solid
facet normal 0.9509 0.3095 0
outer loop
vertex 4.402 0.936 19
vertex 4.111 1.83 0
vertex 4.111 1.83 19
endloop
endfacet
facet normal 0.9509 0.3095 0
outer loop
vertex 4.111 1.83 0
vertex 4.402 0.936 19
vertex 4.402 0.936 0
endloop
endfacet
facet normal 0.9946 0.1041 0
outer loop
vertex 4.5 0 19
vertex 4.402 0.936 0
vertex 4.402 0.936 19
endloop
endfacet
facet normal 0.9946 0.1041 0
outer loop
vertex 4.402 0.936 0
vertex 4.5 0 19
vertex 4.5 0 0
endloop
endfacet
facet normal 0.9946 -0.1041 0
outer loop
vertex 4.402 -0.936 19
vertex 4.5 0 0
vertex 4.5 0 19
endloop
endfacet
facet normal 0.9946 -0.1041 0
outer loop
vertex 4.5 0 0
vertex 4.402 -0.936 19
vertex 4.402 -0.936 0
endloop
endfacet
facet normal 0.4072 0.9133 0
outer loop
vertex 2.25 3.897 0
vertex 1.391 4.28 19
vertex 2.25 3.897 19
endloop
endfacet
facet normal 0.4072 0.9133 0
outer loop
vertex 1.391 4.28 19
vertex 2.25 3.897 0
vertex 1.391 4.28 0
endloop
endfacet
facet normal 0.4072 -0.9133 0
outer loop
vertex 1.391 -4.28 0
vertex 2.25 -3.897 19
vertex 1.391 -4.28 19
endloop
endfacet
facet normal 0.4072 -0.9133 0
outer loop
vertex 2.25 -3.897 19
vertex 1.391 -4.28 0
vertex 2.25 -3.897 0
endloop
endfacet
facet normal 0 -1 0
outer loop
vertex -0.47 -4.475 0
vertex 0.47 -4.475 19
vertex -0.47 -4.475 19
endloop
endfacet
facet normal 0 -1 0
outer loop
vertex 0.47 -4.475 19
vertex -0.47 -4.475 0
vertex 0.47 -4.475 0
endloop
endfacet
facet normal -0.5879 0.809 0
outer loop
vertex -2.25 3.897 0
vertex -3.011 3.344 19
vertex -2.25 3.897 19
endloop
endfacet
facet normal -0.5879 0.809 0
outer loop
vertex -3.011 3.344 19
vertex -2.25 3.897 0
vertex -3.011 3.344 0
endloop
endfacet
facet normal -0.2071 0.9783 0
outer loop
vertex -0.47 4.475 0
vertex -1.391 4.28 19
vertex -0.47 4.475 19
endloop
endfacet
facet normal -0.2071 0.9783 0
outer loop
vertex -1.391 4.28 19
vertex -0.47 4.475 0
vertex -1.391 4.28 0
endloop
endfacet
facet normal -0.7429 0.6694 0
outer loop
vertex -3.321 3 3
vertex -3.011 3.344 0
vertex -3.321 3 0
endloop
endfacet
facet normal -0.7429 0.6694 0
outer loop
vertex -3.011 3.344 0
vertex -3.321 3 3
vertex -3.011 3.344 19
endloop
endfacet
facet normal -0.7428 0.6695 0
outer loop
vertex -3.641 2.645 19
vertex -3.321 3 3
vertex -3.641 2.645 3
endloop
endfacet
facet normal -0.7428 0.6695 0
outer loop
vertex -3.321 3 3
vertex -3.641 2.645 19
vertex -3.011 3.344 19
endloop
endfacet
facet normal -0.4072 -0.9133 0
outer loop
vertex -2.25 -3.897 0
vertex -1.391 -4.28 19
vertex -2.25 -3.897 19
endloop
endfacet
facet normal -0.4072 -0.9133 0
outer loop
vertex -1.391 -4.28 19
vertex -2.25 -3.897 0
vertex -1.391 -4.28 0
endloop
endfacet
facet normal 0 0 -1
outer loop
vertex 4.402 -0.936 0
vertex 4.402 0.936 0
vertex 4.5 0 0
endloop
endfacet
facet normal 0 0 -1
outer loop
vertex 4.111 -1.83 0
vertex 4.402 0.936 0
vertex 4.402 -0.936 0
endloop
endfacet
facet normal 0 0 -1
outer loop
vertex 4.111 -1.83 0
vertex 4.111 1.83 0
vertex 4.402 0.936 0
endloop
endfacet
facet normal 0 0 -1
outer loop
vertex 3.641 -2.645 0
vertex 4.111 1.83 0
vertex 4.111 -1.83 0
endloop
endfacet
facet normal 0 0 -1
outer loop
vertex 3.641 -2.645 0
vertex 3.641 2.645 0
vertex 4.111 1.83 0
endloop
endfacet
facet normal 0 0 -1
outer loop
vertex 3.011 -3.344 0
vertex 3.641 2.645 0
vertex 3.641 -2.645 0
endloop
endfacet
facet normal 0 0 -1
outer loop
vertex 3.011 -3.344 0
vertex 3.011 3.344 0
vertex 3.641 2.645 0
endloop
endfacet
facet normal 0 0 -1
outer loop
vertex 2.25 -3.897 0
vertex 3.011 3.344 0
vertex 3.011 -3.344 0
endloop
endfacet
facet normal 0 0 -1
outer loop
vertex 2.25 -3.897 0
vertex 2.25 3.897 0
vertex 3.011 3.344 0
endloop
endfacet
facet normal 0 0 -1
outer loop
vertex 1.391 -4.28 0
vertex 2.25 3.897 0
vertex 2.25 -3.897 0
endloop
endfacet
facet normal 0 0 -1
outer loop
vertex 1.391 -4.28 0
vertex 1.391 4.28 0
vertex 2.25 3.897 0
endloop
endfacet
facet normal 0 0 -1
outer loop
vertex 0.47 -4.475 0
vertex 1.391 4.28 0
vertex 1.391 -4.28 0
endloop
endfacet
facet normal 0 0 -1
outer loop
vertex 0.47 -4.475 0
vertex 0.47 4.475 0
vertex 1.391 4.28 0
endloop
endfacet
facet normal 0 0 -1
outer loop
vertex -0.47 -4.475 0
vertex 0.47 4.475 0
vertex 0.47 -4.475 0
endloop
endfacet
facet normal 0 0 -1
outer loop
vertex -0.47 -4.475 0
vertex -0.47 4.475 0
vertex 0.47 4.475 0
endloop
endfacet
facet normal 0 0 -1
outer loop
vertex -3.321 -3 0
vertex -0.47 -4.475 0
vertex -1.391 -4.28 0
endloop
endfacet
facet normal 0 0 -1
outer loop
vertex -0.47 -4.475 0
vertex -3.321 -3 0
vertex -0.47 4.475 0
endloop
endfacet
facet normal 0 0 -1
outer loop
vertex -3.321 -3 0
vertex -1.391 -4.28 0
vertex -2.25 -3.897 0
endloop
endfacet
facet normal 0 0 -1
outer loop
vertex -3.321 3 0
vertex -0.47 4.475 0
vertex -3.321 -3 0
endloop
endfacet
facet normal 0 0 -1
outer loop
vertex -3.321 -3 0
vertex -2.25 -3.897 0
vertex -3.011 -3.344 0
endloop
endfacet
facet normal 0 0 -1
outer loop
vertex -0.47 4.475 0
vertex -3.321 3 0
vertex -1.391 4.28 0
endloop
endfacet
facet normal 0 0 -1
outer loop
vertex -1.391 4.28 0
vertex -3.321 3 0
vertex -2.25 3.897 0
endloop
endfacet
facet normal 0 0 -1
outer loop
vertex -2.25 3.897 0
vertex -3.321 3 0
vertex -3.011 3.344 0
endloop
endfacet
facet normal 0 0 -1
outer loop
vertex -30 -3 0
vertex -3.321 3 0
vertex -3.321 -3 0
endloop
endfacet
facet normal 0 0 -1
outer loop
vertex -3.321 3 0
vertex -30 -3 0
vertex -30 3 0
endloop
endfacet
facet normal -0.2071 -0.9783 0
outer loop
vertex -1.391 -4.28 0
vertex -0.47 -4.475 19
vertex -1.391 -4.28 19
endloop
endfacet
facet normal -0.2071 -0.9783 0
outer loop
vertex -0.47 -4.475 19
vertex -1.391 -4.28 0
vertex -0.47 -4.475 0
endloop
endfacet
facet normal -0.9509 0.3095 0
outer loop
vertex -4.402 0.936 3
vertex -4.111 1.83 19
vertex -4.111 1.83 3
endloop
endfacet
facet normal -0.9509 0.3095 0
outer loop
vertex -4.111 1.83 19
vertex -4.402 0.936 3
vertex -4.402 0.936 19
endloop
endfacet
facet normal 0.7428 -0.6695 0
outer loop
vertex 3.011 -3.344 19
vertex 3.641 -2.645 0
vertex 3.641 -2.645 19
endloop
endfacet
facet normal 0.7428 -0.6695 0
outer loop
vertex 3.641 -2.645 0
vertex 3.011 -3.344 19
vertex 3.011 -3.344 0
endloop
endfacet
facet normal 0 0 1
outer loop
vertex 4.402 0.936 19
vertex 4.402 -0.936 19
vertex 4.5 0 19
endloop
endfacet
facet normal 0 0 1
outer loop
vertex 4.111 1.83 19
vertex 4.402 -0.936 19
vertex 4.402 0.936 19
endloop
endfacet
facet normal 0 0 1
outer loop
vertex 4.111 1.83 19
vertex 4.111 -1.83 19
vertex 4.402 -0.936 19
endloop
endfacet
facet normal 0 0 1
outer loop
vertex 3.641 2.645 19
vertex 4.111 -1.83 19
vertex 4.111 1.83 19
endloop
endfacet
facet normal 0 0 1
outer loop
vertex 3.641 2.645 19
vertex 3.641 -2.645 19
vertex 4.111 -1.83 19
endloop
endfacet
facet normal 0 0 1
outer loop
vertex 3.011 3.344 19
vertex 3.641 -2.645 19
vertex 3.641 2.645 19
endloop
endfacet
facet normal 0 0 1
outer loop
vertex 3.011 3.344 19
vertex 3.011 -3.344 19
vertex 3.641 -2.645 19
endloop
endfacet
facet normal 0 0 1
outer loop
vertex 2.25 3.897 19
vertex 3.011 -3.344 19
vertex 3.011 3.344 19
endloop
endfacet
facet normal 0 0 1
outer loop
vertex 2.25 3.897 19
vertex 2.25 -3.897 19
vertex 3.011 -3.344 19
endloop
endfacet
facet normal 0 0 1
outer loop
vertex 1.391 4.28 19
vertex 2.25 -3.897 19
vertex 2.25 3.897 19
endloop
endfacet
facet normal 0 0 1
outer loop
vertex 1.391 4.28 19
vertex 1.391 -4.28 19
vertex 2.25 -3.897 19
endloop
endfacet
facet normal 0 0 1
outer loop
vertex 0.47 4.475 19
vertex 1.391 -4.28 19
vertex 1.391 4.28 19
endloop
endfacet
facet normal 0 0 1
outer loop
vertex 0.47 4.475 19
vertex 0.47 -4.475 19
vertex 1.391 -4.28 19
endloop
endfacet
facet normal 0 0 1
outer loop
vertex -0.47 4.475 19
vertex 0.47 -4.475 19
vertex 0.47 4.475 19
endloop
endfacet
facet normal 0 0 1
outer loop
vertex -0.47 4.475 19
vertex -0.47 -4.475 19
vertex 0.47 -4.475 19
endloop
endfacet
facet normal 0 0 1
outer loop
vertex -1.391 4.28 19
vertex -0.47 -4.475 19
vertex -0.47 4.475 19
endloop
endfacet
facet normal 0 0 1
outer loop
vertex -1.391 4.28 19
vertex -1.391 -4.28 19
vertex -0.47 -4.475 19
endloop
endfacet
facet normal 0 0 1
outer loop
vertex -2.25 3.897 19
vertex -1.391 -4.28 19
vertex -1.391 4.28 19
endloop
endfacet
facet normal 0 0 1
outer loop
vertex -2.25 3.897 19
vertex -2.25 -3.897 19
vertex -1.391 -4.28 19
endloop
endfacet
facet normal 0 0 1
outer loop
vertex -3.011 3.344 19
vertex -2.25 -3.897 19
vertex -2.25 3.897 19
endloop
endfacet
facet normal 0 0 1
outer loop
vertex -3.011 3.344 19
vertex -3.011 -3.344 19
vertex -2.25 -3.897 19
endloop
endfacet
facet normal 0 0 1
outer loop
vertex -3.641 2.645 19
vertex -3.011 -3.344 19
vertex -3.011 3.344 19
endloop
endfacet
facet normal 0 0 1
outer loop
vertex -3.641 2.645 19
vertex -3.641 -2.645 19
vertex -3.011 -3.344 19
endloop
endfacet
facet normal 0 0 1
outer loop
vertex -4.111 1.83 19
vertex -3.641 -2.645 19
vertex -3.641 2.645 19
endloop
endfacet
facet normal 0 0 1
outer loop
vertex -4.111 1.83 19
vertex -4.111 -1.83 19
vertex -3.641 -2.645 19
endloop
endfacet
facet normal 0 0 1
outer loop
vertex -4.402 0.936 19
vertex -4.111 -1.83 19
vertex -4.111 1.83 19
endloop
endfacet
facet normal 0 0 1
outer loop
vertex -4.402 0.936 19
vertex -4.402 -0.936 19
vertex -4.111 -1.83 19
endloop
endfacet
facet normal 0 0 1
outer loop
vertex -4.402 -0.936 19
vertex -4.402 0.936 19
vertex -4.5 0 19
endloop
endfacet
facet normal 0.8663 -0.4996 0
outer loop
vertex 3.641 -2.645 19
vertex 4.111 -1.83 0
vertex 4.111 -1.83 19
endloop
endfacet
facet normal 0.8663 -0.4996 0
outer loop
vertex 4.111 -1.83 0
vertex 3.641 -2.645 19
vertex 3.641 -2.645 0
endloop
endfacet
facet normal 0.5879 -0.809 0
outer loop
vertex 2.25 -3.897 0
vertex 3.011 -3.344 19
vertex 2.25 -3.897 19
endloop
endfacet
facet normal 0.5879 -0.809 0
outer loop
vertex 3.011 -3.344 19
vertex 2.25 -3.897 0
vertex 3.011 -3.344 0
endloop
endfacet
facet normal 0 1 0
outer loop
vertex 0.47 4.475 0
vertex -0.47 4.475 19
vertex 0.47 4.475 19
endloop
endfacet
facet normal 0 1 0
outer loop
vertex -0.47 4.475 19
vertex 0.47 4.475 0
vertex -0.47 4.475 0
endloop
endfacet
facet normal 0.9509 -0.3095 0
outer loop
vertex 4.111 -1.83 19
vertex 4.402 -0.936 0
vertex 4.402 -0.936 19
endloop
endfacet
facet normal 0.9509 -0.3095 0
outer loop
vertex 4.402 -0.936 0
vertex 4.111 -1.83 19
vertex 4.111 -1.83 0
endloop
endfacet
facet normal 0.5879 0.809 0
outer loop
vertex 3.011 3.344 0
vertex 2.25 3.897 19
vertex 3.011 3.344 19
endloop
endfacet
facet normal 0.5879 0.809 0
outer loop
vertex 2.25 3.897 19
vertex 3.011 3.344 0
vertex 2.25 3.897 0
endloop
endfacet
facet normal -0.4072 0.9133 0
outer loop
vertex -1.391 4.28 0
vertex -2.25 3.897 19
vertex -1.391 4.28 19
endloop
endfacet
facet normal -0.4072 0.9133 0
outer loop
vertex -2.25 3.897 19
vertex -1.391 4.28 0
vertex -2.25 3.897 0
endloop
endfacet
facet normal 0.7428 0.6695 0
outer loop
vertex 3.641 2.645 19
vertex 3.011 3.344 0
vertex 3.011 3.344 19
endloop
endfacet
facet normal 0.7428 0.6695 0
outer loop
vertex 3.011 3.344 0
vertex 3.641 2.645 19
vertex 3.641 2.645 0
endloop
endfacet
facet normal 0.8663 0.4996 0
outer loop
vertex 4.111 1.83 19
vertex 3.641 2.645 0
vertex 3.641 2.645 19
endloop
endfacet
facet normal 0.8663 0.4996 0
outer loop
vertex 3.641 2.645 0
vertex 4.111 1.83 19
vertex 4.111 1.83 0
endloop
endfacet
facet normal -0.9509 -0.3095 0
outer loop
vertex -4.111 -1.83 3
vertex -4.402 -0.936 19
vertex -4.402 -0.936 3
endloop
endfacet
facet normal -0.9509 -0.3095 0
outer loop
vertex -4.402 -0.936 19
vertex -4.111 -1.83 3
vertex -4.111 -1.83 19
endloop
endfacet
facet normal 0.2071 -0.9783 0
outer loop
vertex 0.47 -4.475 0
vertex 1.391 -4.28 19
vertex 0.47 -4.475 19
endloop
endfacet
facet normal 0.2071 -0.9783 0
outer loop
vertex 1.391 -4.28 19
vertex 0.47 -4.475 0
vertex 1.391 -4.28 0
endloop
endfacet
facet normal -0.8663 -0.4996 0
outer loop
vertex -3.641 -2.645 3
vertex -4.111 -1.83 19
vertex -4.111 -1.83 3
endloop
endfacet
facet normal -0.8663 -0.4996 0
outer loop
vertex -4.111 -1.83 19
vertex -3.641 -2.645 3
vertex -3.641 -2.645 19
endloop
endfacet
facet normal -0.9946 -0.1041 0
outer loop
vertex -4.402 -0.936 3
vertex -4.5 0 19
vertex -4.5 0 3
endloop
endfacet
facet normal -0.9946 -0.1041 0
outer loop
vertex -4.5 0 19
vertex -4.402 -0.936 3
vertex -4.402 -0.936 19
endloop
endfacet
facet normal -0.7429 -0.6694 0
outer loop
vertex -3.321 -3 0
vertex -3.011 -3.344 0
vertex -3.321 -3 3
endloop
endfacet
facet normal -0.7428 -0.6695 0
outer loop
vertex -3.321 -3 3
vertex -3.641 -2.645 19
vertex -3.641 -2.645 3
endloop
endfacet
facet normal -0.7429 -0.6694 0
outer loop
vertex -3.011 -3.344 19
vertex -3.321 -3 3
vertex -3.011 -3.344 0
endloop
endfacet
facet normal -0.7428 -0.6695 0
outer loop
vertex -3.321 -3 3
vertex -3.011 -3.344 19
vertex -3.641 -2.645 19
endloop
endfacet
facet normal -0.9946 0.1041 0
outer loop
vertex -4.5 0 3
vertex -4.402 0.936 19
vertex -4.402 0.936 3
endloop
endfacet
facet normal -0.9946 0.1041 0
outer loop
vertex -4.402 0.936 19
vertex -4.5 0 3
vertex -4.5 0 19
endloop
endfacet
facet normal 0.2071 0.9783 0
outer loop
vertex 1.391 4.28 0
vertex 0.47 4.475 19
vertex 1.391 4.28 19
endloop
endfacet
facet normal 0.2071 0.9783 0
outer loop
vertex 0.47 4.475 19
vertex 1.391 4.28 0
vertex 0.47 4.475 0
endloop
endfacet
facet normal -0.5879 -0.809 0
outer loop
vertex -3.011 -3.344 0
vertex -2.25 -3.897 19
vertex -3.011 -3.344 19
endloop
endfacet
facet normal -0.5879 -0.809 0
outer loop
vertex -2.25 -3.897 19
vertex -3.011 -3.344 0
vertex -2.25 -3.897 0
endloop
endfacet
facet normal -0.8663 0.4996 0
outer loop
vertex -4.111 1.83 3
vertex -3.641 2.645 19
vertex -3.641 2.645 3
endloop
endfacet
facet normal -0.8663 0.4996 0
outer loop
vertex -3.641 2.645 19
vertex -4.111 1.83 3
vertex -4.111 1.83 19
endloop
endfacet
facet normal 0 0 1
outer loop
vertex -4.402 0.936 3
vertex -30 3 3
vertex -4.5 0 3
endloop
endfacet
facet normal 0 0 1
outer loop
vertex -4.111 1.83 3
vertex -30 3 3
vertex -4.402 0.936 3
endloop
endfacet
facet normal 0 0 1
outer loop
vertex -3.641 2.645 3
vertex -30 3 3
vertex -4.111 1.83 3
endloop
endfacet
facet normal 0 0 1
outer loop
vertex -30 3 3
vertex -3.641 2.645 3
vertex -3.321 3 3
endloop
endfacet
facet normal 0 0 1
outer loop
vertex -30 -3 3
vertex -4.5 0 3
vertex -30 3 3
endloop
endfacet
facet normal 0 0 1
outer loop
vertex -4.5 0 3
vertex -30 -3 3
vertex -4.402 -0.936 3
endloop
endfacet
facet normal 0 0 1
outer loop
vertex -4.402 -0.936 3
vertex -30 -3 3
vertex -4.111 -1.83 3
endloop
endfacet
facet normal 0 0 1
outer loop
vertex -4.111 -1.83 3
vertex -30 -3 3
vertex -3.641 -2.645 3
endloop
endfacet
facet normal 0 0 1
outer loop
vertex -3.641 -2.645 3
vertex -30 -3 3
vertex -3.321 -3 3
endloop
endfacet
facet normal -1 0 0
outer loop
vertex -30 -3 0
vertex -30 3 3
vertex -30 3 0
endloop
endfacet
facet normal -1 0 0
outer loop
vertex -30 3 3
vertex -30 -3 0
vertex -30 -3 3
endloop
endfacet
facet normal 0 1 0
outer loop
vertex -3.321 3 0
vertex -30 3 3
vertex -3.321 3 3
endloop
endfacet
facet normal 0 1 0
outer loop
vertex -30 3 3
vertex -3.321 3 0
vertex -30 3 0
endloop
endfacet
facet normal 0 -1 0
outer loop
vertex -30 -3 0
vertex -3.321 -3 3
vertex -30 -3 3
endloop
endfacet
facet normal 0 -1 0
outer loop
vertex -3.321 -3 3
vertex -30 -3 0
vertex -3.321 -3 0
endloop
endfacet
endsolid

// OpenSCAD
cal_diameter = 9;
cal_height = 19;
$fn=30;cylinder (r = cal_diameter/2,h = cal_height);
translate ([-30, -3, 0]) cube ([30, 6, 3]);
